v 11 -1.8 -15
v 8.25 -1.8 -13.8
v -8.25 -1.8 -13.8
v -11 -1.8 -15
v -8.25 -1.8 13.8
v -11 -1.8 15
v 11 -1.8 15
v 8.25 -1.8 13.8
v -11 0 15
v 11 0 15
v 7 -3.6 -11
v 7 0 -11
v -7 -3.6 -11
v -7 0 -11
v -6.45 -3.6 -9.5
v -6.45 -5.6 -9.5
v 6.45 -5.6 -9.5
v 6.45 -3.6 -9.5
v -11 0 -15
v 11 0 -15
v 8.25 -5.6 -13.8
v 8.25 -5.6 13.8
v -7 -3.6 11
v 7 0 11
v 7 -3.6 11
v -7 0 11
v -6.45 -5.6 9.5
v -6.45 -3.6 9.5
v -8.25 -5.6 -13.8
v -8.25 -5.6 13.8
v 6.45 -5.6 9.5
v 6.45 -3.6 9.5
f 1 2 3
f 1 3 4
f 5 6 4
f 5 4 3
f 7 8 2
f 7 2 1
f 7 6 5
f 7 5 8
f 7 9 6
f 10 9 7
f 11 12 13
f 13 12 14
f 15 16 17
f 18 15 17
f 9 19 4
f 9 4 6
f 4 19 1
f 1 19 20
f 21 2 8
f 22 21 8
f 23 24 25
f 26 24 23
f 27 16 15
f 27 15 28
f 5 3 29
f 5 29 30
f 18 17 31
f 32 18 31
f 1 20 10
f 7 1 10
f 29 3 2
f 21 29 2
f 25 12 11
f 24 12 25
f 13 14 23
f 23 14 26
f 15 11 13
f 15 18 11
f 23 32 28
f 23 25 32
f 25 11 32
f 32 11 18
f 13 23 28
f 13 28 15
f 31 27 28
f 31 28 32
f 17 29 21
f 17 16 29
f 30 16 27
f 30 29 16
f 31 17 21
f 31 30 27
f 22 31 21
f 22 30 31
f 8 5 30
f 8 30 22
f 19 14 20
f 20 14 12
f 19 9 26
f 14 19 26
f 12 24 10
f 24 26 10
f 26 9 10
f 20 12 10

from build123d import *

# Parameters (mm, degrees)
F0_W     = 22
F0_H     = 30
F1_DEPTH = 1.8
F2_W     = 16.5
F2_H     = 27.6
F3_DEPTH = 3.8
F4_W     = 12.9
F4_H     = 19
F5_DEPTH = 25
F6_W     = 14
F6_H     = 22
F7_DEPTH = 3.6


with BuildPart() as f1:
    # F0 (on Front) → F1 (new body)
    with BuildSketch(Plane.XZ):
        Rectangle(F0_W, F0_H)
    extrude(amount=F1_DEPTH)

    # F2 (on face) → F3 (join)
    with BuildSketch(Plane.XZ.offset(1.8)):
        Rectangle(F2_W, F2_H)
    extrude(amount=F3_DEPTH)

    # F4 (on face) → F5 (cut)
    with BuildSketch(Plane.XZ.offset(5.6)):
        Rectangle(F4_W, F4_H)
    extrude(amount=-F5_DEPTH, mode=Mode.SUBTRACT)

    # F6 (on face) → F7 (cut)
    with BuildSketch(Plane(origin=(0, 0, 0), x_dir=(-1, 0, 0), z_dir=(0, 1, 0))):
        Rectangle(F6_W, F6_H)
    extrude(amount=-F7_DEPTH, mode=Mode.SUBTRACT)


solid = f1.part
